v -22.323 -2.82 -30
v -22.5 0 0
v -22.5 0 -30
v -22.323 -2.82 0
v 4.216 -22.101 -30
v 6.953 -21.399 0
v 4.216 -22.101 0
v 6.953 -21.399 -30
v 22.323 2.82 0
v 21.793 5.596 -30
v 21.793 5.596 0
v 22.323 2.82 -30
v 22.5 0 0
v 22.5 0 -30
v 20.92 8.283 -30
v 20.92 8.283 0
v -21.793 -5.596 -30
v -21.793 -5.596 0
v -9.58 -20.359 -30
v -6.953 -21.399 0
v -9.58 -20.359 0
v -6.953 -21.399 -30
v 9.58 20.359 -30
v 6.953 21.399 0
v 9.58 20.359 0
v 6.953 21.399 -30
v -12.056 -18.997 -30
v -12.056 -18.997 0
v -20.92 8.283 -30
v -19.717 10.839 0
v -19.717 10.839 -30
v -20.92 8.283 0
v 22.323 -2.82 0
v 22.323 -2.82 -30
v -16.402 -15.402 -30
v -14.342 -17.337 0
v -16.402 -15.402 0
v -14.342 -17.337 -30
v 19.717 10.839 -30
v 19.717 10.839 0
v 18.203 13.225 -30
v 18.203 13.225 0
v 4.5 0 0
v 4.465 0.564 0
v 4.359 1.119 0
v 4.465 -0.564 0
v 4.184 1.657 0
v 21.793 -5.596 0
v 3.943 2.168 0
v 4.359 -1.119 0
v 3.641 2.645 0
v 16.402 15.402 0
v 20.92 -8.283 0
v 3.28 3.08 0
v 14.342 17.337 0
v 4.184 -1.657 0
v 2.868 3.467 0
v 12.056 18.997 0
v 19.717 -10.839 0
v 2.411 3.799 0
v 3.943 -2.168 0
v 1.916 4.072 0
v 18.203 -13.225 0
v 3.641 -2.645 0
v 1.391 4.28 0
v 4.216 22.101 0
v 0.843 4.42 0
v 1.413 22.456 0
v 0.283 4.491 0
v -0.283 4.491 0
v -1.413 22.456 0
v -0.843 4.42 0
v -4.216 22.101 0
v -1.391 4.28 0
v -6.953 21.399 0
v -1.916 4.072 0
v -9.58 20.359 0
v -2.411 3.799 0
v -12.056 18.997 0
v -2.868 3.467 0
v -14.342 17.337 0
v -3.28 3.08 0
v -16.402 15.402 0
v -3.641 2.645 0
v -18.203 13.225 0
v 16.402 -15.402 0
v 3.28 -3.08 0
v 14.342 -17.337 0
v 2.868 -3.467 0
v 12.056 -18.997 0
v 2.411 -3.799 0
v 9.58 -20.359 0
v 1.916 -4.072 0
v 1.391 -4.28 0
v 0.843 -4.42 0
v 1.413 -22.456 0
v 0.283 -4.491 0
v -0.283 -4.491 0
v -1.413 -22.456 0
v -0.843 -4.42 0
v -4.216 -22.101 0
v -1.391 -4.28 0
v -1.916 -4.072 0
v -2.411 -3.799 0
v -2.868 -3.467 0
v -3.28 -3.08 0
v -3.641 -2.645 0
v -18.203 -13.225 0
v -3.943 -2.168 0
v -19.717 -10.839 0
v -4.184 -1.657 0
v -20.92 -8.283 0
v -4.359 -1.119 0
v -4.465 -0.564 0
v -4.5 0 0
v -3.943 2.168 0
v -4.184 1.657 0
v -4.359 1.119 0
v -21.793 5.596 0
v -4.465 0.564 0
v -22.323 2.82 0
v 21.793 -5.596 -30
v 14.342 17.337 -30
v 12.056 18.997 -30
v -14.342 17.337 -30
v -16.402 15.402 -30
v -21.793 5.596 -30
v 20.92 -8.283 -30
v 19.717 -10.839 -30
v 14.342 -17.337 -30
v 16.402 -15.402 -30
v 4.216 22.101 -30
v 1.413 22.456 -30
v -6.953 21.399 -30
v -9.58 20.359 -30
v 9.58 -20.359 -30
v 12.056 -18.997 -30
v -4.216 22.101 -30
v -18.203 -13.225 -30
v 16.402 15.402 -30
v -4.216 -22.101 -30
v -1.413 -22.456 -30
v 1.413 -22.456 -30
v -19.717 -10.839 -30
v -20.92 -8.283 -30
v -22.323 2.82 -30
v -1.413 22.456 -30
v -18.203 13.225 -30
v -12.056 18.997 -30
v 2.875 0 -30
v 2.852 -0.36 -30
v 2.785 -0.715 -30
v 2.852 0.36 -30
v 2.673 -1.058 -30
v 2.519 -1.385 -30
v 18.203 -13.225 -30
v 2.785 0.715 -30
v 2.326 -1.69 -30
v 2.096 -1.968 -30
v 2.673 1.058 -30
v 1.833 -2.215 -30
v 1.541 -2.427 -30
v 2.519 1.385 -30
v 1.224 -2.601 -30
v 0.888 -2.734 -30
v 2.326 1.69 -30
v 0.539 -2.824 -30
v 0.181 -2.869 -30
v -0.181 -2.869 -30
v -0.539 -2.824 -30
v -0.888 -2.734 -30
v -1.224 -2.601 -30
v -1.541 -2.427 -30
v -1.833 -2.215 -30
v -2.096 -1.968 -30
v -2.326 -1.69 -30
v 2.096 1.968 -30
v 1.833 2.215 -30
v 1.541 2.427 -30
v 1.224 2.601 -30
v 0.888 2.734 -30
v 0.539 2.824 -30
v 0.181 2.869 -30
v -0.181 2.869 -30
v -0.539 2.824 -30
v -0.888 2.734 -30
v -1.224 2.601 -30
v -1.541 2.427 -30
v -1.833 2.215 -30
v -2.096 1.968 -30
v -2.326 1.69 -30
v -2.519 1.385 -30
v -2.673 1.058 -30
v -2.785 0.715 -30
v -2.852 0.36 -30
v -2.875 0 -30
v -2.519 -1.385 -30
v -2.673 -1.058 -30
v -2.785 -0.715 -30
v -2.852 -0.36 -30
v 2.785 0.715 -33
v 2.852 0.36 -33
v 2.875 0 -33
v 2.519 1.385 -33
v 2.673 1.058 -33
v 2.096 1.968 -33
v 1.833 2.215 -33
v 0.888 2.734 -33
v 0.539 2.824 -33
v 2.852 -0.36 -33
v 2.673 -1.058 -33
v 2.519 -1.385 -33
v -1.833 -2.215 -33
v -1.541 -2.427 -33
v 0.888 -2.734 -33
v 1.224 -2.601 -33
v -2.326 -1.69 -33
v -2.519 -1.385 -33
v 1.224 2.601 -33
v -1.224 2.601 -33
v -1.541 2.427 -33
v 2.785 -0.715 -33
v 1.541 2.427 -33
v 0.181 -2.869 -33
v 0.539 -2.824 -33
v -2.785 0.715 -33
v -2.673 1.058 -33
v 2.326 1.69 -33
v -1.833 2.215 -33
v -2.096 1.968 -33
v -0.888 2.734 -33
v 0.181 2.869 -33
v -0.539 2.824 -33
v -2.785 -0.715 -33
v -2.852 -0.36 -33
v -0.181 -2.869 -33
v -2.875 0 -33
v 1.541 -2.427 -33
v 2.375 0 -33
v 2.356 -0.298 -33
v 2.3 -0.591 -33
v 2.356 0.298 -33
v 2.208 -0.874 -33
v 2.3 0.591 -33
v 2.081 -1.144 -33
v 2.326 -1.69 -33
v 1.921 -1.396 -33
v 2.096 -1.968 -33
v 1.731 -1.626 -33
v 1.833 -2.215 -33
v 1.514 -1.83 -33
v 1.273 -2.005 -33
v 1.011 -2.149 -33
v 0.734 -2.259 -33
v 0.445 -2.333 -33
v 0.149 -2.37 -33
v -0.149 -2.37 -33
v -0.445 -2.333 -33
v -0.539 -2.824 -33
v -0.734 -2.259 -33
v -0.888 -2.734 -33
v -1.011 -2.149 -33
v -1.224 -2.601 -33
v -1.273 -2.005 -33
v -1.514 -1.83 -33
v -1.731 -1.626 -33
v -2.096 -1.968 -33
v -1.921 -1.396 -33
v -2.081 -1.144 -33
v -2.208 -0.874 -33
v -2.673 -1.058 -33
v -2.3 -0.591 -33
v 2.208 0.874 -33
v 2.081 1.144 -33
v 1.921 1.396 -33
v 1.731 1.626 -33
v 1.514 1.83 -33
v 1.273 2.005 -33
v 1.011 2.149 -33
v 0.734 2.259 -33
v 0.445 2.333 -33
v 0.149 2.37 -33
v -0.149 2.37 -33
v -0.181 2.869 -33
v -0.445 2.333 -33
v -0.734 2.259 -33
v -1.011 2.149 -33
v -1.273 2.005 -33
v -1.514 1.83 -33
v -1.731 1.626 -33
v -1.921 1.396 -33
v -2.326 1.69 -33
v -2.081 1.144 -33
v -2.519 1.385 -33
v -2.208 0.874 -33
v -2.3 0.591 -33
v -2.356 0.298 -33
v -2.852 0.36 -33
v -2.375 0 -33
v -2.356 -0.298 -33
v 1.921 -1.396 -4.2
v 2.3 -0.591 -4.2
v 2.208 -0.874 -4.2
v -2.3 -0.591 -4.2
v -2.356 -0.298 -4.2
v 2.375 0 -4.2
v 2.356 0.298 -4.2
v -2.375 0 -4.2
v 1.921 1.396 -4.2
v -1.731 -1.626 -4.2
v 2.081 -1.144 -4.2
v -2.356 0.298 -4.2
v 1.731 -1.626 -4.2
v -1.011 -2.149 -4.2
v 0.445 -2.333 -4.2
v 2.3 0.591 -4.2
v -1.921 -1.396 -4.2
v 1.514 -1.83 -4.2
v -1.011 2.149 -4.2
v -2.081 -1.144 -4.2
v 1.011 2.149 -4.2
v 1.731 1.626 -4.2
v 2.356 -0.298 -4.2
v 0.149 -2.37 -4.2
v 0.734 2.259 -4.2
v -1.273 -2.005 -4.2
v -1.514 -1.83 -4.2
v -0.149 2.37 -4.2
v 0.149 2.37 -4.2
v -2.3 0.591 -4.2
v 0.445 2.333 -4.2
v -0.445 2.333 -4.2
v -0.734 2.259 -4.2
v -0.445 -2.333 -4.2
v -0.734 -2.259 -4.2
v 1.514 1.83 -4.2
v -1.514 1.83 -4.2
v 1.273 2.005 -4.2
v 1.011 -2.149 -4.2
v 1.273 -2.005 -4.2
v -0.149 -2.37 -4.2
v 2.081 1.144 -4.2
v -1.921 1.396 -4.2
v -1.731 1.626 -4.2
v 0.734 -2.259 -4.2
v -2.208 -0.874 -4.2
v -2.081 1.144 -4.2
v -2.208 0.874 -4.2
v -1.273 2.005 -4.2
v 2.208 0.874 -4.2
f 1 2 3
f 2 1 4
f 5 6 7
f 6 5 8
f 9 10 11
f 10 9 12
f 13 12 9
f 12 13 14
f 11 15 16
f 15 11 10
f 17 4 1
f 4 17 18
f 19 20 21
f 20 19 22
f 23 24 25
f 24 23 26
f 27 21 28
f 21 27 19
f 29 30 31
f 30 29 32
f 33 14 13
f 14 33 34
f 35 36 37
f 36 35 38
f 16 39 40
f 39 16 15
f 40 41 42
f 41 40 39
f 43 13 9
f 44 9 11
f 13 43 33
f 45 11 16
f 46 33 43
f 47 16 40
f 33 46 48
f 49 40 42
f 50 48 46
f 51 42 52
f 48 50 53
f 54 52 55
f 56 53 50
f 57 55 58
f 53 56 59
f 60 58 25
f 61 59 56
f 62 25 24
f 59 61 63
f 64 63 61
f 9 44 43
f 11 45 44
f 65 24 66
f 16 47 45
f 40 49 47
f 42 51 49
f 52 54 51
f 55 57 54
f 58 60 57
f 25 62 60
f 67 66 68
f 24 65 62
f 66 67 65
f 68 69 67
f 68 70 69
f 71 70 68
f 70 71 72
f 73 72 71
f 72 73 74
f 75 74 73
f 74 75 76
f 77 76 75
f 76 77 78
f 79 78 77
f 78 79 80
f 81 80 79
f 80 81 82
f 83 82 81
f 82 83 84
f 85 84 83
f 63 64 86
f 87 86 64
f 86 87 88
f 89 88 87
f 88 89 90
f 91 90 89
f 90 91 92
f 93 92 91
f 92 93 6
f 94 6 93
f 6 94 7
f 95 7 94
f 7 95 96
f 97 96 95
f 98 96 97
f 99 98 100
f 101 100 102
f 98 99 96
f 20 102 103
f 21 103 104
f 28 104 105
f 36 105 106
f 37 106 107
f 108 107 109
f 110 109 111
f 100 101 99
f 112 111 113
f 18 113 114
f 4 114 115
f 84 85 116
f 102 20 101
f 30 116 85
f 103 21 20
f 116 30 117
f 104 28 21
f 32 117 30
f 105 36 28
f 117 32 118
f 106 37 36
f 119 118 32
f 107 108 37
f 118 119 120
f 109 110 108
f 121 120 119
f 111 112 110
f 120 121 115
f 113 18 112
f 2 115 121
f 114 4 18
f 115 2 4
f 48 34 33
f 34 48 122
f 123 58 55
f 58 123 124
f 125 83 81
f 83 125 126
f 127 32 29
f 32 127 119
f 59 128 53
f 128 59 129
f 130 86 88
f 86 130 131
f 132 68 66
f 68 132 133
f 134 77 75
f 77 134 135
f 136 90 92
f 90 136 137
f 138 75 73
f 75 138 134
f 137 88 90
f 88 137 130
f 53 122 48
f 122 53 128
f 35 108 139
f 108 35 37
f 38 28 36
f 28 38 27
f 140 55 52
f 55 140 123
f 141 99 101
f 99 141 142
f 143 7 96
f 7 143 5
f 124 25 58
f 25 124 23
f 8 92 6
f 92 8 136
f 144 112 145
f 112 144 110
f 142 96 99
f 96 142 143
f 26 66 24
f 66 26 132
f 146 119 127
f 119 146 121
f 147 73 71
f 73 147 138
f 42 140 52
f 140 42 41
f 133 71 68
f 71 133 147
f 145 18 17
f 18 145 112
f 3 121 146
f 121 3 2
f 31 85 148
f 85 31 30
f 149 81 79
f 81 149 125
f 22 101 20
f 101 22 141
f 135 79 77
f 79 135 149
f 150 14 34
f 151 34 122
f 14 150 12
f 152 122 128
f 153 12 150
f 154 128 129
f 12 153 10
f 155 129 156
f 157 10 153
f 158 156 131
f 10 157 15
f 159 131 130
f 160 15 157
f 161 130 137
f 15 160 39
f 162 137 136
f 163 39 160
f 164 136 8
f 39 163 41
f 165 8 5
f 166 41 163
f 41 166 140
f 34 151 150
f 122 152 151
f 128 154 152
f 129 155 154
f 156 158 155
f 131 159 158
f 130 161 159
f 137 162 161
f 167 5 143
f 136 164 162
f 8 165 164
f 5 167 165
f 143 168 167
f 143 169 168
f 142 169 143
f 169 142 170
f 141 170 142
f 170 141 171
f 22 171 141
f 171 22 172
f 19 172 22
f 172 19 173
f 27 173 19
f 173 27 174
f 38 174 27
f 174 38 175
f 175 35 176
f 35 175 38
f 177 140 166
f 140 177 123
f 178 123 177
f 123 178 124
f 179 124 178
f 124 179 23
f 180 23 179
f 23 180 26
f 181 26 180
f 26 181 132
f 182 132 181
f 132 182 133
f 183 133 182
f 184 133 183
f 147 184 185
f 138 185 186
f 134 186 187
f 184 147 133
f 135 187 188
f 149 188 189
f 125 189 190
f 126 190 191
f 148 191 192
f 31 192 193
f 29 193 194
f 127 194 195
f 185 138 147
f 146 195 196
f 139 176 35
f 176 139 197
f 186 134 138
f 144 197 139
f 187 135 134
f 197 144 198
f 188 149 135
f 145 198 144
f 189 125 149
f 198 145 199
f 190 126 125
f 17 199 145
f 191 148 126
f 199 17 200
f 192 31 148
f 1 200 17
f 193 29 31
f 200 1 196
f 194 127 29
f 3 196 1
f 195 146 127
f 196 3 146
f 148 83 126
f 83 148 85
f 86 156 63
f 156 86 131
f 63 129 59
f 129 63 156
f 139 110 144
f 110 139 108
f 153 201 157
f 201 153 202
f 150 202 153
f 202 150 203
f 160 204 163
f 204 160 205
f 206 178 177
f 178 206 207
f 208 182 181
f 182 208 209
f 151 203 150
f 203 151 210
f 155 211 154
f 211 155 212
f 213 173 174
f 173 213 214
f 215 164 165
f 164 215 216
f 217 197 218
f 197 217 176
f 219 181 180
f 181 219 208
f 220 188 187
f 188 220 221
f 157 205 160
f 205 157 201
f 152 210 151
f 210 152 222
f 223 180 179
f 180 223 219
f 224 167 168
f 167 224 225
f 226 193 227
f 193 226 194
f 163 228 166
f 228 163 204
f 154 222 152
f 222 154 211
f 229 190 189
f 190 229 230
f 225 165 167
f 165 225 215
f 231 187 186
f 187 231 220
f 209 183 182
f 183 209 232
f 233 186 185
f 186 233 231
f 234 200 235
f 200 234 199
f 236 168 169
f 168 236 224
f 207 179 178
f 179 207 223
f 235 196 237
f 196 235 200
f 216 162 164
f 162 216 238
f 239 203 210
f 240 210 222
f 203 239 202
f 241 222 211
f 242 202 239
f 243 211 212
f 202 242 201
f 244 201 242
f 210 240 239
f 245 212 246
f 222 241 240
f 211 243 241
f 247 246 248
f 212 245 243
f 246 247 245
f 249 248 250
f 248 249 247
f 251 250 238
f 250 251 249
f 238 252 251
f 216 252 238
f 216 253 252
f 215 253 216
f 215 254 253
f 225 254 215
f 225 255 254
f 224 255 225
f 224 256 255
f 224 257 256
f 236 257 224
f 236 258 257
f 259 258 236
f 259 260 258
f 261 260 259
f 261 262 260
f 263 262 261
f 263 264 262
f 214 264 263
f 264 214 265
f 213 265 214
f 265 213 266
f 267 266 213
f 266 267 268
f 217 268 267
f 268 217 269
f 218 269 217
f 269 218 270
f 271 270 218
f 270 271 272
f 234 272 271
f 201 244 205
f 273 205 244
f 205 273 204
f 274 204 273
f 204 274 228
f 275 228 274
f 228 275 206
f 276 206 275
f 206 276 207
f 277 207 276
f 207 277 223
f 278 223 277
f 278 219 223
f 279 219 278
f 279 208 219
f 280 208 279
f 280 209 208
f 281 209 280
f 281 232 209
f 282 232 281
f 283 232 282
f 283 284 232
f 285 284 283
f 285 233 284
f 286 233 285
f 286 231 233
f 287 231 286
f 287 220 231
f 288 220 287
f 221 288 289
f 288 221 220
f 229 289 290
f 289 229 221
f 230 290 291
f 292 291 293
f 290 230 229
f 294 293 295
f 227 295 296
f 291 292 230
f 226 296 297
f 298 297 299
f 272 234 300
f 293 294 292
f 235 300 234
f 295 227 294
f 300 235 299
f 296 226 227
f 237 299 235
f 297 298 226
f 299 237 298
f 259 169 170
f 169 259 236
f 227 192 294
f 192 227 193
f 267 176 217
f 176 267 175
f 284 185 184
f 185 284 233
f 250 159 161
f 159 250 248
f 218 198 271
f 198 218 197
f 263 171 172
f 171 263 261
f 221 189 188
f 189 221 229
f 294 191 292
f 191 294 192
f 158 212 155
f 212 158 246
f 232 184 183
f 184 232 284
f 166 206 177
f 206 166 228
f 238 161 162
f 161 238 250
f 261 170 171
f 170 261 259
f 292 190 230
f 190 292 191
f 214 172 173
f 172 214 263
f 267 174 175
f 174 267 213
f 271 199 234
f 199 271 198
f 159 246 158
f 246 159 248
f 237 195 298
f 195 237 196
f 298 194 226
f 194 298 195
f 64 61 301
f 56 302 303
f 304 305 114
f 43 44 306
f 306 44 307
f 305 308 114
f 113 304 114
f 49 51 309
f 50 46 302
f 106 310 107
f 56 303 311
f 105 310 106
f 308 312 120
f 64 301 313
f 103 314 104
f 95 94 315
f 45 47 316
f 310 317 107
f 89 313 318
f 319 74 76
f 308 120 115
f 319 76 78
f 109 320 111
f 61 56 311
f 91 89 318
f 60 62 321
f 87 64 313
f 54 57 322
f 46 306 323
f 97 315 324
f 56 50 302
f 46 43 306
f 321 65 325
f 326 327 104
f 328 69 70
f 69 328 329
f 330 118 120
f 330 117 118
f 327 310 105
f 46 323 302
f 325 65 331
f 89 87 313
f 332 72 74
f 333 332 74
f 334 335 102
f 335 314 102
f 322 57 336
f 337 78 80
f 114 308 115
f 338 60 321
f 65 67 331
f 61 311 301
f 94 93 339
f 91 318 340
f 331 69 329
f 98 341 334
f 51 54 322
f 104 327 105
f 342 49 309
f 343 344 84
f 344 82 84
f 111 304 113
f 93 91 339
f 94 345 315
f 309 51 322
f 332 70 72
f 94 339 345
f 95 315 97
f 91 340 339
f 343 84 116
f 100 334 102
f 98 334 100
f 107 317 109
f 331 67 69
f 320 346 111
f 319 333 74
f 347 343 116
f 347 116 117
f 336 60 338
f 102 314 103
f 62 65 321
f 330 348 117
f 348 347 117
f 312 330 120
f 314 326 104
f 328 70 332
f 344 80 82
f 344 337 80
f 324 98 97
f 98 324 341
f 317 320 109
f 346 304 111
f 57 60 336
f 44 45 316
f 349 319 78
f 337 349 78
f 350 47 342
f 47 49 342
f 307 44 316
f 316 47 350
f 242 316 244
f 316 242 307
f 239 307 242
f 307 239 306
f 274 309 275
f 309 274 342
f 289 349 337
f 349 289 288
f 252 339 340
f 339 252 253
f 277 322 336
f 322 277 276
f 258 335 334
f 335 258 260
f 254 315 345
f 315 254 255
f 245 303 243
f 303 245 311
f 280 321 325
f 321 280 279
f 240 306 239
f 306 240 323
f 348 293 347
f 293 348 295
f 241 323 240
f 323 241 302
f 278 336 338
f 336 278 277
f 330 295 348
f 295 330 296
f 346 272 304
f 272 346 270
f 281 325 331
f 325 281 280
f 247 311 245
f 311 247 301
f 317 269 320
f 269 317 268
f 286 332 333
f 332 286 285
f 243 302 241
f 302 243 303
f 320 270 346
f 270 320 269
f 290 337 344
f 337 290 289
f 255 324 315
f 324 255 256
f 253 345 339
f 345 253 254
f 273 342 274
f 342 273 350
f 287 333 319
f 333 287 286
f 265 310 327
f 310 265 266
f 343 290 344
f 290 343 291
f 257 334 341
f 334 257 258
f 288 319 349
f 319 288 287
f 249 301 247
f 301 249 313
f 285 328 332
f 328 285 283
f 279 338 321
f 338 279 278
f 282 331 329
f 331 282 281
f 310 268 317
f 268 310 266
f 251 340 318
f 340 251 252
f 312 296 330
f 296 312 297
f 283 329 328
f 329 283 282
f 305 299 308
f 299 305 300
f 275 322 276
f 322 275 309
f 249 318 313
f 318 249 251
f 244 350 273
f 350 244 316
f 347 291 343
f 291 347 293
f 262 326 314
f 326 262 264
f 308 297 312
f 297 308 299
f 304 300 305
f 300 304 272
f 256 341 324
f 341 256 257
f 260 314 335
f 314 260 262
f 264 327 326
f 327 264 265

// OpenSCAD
$fn = 50;

difference() {
	union() {
		translate(v = [0, 0, -30.0]) {
			cylinder(h = 30, r = 22.5);
		}
		#translate(v = [0, 0, -33.0]) {
			cylinder(h = 33, r = 2.875);
		}
	}
	union() {
		translate(v = [0, 0, 0]) {
			rotate(a = [0, 0, 0]) {
				difference() {
					union() {
						translate(v = [0, 0, -33.0]) {
							cylinder(h = 33, r = 2.25);
						}
						translate(v = [0, 0, -4.2]) {
							cylinder(h = 4.2, r1 = 2.375, r2 = 4.5);
						}
						translate(v = [0, 0, -33.0]) {
							cylinder(h = 33, r = 2.375);
						}
						translate(v = [0, 0, -33.0]) {
							cylinder(h = 33, r = 2.25);
						}
					}
					union();
				}
			}
		}
	}
}
